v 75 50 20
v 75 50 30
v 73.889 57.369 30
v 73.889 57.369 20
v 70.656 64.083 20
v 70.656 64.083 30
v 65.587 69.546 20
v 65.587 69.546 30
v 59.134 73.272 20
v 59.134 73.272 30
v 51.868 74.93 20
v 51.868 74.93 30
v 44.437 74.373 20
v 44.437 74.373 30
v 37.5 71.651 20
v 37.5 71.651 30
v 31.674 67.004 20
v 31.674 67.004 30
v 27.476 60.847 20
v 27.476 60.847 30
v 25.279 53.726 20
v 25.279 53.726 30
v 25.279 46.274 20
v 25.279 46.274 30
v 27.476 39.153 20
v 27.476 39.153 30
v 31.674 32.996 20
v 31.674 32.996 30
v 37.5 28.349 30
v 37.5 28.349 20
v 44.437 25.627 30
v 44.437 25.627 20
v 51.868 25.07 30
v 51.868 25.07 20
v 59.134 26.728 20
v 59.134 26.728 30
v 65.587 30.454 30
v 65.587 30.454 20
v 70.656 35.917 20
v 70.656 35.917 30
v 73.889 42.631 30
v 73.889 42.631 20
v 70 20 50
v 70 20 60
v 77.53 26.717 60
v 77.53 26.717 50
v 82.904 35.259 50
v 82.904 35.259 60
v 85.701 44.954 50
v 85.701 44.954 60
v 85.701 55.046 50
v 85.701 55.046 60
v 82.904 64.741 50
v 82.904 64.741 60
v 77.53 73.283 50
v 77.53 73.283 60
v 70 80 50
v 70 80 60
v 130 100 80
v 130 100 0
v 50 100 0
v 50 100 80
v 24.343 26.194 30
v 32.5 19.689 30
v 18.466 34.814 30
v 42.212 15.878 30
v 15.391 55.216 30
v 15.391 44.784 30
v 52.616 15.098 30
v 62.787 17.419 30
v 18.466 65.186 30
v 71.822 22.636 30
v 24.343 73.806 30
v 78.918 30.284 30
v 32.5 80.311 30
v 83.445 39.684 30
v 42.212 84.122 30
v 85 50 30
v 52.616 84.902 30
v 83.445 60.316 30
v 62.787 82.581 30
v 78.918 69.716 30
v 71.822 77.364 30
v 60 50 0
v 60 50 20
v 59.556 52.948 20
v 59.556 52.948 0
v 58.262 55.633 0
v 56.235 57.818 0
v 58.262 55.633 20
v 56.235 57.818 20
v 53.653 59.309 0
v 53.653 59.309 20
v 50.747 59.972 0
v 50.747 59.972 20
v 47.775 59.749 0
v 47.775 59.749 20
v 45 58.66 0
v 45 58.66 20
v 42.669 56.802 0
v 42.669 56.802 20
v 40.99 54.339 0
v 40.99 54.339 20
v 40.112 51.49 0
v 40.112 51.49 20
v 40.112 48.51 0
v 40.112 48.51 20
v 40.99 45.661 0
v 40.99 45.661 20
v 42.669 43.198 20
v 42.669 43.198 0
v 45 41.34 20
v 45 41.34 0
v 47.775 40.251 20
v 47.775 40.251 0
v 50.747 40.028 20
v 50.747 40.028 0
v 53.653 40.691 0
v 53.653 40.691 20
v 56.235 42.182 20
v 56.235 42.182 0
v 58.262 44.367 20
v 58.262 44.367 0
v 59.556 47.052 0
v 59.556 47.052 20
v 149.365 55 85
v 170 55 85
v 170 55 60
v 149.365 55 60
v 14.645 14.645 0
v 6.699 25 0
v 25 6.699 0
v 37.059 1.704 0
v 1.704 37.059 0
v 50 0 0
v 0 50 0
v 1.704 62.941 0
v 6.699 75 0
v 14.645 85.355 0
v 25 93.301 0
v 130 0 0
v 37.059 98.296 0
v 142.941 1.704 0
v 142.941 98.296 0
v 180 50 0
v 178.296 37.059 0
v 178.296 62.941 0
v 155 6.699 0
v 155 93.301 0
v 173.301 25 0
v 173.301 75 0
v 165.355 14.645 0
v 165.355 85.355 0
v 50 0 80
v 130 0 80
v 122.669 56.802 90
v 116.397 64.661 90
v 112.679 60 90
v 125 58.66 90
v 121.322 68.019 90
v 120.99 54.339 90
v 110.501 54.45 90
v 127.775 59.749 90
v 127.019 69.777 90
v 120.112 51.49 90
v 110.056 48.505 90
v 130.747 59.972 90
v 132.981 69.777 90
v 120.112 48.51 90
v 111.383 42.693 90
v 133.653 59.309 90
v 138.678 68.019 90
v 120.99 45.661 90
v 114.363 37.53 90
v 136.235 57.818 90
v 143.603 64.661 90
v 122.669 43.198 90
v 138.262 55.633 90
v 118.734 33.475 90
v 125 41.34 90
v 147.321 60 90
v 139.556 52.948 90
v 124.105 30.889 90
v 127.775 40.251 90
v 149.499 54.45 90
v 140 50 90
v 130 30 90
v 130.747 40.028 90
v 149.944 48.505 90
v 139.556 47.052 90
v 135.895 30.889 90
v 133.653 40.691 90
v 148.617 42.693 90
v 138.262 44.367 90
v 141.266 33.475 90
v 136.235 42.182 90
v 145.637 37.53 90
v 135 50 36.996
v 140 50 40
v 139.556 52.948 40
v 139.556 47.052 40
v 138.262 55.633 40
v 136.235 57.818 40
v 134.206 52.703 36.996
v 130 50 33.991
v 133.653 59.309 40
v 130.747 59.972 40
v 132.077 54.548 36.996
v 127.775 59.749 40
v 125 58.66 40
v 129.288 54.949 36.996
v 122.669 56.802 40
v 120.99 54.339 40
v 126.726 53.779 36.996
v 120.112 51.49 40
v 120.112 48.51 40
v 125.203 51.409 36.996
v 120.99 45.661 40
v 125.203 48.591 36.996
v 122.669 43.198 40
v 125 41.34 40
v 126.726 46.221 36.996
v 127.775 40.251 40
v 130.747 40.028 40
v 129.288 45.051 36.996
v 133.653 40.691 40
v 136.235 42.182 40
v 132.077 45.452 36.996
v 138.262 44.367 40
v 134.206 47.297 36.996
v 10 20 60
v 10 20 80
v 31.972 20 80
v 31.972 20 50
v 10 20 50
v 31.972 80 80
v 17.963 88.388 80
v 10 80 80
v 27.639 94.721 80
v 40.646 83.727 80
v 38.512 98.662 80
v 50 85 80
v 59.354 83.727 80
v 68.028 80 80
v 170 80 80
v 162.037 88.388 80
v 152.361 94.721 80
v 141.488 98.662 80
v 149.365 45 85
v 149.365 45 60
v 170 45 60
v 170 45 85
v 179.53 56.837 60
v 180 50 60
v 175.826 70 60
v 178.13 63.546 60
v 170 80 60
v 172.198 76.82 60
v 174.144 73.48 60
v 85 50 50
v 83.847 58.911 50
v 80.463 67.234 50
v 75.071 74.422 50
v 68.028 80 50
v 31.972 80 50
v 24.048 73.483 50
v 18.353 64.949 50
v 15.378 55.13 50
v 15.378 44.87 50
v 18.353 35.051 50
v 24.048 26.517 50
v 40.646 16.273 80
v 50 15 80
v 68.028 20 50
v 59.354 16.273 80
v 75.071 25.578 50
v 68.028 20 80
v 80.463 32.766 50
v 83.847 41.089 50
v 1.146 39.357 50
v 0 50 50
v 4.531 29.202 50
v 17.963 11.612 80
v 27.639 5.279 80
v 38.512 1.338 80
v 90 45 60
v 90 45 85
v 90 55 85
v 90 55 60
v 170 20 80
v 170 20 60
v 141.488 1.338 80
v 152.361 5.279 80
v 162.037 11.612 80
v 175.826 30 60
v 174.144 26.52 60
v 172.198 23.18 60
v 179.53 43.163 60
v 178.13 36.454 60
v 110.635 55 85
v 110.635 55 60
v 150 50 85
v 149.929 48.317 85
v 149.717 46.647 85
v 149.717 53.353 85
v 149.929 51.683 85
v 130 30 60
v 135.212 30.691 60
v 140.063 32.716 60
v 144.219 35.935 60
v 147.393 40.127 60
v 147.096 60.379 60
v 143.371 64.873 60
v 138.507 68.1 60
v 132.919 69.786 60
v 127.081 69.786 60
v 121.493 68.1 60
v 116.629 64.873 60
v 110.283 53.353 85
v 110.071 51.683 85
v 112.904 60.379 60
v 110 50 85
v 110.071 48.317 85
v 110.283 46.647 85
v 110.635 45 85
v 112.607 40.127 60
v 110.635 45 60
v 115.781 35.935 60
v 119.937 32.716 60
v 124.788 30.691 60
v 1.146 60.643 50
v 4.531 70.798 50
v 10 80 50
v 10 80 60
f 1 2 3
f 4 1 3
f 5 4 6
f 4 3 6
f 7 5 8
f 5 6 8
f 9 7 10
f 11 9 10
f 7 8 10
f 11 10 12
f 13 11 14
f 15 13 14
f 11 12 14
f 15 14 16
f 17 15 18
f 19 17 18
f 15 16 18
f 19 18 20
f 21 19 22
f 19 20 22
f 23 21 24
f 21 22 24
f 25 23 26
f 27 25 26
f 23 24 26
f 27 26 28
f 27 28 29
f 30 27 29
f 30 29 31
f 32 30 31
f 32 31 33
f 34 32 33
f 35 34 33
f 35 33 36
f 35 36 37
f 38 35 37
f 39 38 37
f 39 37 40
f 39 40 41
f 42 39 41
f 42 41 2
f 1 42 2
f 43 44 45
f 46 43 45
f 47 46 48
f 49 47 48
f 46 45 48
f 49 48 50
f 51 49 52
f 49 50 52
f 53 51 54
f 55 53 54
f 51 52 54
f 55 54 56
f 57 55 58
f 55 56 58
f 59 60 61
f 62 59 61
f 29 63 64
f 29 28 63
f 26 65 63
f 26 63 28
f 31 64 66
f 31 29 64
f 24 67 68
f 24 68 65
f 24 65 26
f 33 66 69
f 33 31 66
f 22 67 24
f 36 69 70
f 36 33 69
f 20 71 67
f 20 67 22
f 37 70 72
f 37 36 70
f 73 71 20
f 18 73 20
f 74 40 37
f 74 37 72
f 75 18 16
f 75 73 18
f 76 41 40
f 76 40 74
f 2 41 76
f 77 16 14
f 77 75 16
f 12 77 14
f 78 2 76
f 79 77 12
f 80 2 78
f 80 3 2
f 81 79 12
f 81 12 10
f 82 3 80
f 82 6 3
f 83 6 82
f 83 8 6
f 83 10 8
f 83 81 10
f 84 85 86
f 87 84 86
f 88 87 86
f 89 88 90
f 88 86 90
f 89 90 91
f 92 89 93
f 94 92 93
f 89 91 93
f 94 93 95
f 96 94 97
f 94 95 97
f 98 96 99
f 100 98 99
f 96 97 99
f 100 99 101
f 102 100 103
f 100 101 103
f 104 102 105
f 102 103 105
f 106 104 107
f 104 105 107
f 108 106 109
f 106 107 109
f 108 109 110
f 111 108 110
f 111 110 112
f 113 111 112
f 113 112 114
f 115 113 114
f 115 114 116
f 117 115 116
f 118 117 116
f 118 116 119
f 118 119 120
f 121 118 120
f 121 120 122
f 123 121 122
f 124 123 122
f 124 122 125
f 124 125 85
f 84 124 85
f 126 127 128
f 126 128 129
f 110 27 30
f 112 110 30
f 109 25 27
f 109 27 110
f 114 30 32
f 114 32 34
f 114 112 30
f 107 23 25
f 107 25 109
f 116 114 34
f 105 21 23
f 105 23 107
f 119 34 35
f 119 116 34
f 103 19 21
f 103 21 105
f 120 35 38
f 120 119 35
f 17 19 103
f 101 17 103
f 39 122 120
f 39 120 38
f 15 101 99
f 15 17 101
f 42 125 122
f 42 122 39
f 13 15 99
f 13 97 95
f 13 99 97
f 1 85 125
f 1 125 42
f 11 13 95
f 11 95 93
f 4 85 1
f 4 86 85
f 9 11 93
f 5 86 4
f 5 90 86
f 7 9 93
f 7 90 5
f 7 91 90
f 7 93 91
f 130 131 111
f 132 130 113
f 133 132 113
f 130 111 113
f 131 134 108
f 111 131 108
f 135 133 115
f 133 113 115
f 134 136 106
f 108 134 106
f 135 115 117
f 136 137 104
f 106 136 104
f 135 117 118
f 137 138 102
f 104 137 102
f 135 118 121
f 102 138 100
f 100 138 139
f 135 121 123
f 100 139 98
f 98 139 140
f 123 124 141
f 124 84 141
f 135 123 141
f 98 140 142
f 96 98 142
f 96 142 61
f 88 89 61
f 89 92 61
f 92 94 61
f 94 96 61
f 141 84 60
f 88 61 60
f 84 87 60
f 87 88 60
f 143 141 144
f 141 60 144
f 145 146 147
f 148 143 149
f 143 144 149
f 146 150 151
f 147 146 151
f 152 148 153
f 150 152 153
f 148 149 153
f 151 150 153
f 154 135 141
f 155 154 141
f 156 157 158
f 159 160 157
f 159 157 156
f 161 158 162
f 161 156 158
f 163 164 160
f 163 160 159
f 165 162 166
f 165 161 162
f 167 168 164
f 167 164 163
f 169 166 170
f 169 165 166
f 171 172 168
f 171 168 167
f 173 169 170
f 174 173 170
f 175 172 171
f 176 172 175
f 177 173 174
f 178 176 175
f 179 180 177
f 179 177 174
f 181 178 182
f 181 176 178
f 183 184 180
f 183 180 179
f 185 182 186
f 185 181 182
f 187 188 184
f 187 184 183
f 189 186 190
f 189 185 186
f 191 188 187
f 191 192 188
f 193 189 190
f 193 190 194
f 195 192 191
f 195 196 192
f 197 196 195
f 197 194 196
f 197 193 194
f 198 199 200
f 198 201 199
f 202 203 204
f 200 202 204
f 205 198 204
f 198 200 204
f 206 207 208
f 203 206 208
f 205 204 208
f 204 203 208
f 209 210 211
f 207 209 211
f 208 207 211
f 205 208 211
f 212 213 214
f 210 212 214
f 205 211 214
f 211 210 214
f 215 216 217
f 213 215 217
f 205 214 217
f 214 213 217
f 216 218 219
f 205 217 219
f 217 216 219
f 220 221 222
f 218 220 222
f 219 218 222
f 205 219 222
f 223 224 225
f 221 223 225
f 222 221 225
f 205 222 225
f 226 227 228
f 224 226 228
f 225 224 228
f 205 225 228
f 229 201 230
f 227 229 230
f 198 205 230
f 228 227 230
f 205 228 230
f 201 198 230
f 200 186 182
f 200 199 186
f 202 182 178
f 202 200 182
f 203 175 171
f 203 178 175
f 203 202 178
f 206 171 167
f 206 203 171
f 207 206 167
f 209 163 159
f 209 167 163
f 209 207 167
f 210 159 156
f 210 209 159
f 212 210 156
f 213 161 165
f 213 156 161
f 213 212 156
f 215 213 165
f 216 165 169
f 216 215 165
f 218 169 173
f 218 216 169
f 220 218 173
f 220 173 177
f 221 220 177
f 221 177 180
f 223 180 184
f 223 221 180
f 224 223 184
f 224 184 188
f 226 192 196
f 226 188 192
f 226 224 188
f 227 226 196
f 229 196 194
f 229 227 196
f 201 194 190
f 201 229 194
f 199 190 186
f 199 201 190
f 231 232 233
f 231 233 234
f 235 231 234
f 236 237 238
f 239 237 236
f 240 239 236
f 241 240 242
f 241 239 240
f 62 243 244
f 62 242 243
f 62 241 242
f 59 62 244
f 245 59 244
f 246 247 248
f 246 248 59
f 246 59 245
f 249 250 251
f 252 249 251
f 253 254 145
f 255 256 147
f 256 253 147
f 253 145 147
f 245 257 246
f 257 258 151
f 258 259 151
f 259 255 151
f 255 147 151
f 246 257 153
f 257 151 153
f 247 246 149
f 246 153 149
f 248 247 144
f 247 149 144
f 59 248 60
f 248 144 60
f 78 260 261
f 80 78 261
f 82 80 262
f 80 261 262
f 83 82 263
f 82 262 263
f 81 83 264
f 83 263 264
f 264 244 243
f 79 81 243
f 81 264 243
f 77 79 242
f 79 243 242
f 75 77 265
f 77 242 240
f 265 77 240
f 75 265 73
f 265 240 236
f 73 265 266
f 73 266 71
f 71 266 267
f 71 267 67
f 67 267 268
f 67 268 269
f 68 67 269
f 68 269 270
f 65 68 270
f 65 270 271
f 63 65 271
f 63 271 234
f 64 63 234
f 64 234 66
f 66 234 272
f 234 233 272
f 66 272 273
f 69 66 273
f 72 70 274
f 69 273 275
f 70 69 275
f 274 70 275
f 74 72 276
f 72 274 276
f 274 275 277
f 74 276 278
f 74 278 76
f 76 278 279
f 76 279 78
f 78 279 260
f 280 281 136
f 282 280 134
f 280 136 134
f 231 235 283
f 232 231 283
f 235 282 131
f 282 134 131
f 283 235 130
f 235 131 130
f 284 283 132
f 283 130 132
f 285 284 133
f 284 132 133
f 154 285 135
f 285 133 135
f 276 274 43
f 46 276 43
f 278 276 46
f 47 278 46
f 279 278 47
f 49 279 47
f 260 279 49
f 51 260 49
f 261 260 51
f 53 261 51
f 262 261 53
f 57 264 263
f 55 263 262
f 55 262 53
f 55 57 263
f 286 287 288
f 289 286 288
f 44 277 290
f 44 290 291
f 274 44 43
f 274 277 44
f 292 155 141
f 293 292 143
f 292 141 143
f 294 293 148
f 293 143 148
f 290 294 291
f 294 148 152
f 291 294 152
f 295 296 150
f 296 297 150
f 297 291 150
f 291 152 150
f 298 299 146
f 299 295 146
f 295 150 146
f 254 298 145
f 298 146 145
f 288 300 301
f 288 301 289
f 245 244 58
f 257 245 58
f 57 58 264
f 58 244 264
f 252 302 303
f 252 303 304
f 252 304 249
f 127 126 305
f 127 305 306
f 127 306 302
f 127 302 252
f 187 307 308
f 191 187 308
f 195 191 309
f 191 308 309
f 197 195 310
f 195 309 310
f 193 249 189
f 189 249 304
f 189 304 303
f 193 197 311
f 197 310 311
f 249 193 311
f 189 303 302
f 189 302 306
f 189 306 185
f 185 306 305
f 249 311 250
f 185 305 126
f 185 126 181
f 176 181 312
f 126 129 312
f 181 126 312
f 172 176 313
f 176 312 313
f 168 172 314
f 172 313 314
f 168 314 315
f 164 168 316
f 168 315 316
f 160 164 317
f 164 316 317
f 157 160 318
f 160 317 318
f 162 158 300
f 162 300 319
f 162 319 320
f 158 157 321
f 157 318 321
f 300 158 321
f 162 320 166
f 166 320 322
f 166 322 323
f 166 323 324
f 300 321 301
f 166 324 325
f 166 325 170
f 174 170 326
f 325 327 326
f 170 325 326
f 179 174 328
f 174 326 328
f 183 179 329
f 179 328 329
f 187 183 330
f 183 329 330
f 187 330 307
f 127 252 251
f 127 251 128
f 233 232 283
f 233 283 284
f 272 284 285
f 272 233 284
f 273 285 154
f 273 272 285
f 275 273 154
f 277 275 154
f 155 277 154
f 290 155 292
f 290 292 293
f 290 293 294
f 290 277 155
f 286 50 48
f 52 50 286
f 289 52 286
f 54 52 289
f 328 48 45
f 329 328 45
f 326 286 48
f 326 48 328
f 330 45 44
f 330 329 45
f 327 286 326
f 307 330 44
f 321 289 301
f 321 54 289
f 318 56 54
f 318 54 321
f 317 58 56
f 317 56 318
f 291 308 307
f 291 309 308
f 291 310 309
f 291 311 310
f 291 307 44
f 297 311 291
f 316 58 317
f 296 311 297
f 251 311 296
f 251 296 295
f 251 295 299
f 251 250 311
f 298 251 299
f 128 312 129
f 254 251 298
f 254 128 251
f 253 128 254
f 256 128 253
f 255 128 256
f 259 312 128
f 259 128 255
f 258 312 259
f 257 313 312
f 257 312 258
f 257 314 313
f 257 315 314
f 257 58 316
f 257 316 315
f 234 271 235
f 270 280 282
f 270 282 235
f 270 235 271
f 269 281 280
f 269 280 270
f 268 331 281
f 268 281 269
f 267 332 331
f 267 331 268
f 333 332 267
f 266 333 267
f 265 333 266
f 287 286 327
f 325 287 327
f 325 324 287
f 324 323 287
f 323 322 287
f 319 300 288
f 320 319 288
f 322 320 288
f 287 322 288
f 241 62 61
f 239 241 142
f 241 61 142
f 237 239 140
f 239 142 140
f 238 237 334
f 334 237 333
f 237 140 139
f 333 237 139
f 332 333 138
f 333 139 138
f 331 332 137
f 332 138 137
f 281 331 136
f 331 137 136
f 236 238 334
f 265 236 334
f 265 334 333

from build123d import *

# Parameters (mm, degrees)
BOSS_EXTRUDE1_DEPTH        = 80
SKETCH2_W                  = 20
SKETCH2_H                  = 10
CUT_EXTRUDE1_DEPTH         = 209
SKETCH3_R                  = 10
CUT_EXTRUDE2_DEPTH         = 40
SKETCH4_R                  = 20
SKETCH4_R_2                = 10
BOSS_EXTRUDE2_DEPTH        = 10
F_20_0MM_DOWEL_HOLE1_D     = 20
F_20_0MM_DOWEL_HOLE1_DEPTH = 50
F_20_0MM_DOWEL_HOLE1_TIP   = 6.00860619
CUT_EXTRUDE3_DEPTH         = 20
SKETCH10_R                 = 10
CUT_EXTRUDE4_DEPTH         = 74
SKETCH11_R                 = 25
SKETCH11_R_2               = 10
CUT_EXTRUDE5_DEPTH         = 40
SKETCH12_R                 = 25
CUT_EXTRUDE6_DEPTH         = 10
SKETCH14_R                 = 35
SKETCH14_R_2               = 25
CUT_EXTRUDE7_DEPTH         = 30
SKETCH15_R                 = 35
CUT_EXTRUDE8_DEPTH         = 30
CUT_EXTRUDE9_DEPTH         = 20
SKETCH17_W                 = 20
SKETCH17_H                 = 5
BOSS_EXTRUDE3_DEPTH        = 25
SKETCH18_W                 = 20
SKETCH18_H                 = 5
BOSS_EXTRUDE4_DEPTH        = 25
SKETCH19_W                 = 20
SKETCH19_H                 = 5
BOSS_EXTRUDE5_DEPTH        = 25


with BuildPart() as part:
    # Sketch1 → Boss-Extrude1 (new body)
    with BuildSketch(Plane.XY):
        with BuildLine():
            ThreePointArc((0, 50), (14.644660941, 14.644660941), (50, 0))
            Line((50, 0), (130, 0))
            ThreePointArc((130, 0), (165.355339059, 14.644660941), (180, 50))
            ThreePointArc((180, 50), (165.355339059, 85.355339059), (130, 100))
            Line((130, 100), (50, 100))
            ThreePointArc((50, 100), (14.644660941, 85.355339059), (0, 50))
        make_face()
    extrude(amount=BOSS_EXTRUDE1_DEPTH)

    # Sketch2 → Cut-Extrude1 (cut)
    with BuildSketch(Plane(origin=(0, 0, 0), x_dir=(0, 0, -1), z_dir=(1, 0, 0))):
        with Locations((-70, 75)):
            Rectangle(SKETCH2_W, SKETCH2_H)
        with Locations((-70, 25)):
            Rectangle(SKETCH2_W, SKETCH2_H)
    extrude(amount=CUT_EXTRUDE1_DEPTH, mode=Mode.SUBTRACT)

    # Sketch3 → Cut-Extrude2 (cut)
    with BuildSketch(Plane.XY.offset(80)):
        with Locations((130, 50)):
            Circle(SKETCH3_R)
    extrude(amount=-CUT_EXTRUDE2_DEPTH, mode=Mode.SUBTRACT)

    # Sketch4 → Boss-Extrude2 (add)
    with BuildSketch(Plane.XY.offset(80)):
        with Locations(Location((130, 50, 0), (0, 0, 270))):
            Circle(SKETCH4_R)
        with Locations((130, 50)):
            Circle(SKETCH4_R_2, mode=Mode.SUBTRACT)
    extrude(amount=BOSS_EXTRUDE2_DEPTH)

    # Ø20.0mm Dowel Hole1
    with Locations(Plane(origin=(130, 50, 90), x_dir=(1, 0, 0), z_dir=(0, 0, 1))):
        with Locations((0, 0)):
            Hole(F_20_0MM_DOWEL_HOLE1_D / 2, depth=F_20_0MM_DOWEL_HOLE1_DEPTH)
            with Locations((0, 0, -(F_20_0MM_DOWEL_HOLE1_DEPTH + F_20_0MM_DOWEL_HOLE1_TIP / 2))):  # 118° drill point
                Cone(0, F_20_0MM_DOWEL_HOLE1_D / 2, F_20_0MM_DOWEL_HOLE1_TIP, mode=Mode.SUBTRACT)

    # Sketch9 → Cut-Extrude3 (cut)
    with BuildSketch(Plane.XY.offset(80)):
        with BuildLine():
            Line((130, 70), (4.17424305, 70))
            ThreePointArc((4.17424305, 70), (0, 50), (4.17424305, 30))
            Line((4.17424305, 30), (130, 30))
            ThreePointArc((130, 30), (110, 50), (130, 70))
        make_face()
    extrude(amount=-CUT_EXTRUDE3_DEPTH, mode=Mode.SUBTRACT)

    # Sketch10 → Cut-Extrude4 (cut)
    with BuildSketch(Plane.XY.offset(60)):
        with Locations((50, 50)):
            Circle(SKETCH10_R)
    extrude(amount=-CUT_EXTRUDE4_DEPTH, mode=Mode.SUBTRACT)

    # Sketch11 → Cut-Extrude5 (cut)
    with BuildSketch(Plane.XY.offset(60)):
        with Locations((50, 50)):
            Circle(SKETCH11_R)
        with Locations((50, 50)):
            Circle(SKETCH11_R_2, mode=Mode.SUBTRACT)
    extrude(amount=-CUT_EXTRUDE5_DEPTH, mode=Mode.SUBTRACT)

    # Sketch12 → Cut-Extrude6 (cut)
    with BuildSketch(Plane.XY.offset(60)):
        with BuildLine():
            Line((70, 80), (10, 80))
            ThreePointArc((10, 80), (0, 50), (10, 20))
            Line((10, 20), (70, 20))
            ThreePointArc((70, 20), (86.055512755, 50), (70, 80))
        make_face()
        with Locations((50, 50)):
            Circle(SKETCH12_R, mode=Mode.SUBTRACT)
    extrude(amount=-CUT_EXTRUDE6_DEPTH, mode=Mode.SUBTRACT)

    # Sketch14 → Cut-Extrude7 (cut)
    with BuildSketch(Plane.XY.offset(60)):
        with Locations((50, 50)):
            Circle(SKETCH14_R)
        with Locations((50, 50)):
            Circle(SKETCH14_R_2, mode=Mode.SUBTRACT)
    extrude(amount=-CUT_EXTRUDE7_DEPTH, mode=Mode.SUBTRACT)

    # Sketch15 → Cut-Extrude8 (cut)
    with BuildSketch(Plane.XY.offset(80)):
        with Locations((50, 50)):
            Circle(SKETCH15_R)
    extrude(amount=-CUT_EXTRUDE8_DEPTH, mode=Mode.SUBTRACT)

    # Sketch16 → Cut-Extrude9 (cut)
    with BuildSketch(Plane.XY.offset(80)):
        with BuildLine():
            Line((130, 70), (175.82575695, 70))
            ThreePointArc((175.82575695, 70), (180, 50), (175.82575695, 30))
            Line((175.82575695, 30), (130, 30))
            ThreePointArc((130, 30), (150, 50), (130, 70))
        make_face()
    extrude(amount=-CUT_EXTRUDE9_DEPTH, mode=Mode.SUBTRACT)

    # Sketch17 → Boss-Extrude3 (add)
    with BuildSketch(Plane.XY.offset(60)):
        with BuildLine():
            Line((150, 45), (150, 50))
            ThreePointArc((150, 50), (149.840593925, 47.47991415), (149.364916731, 45))
            Line((149.364916731, 45), (150, 45))
        make_face()
        with Locations((160, 47.5)):
            Rectangle(SKETCH17_W, SKETCH17_H)
        with BuildLine():
            ThreePointArc((110.635083269, 45), (110.159406075, 47.47991415), (110, 50))
            Line((110, 50), (110, 45))
            Line((110, 45), (110.635083269, 45))
        make_face()
        with Locations((100, 47.5)):
            Rectangle(SKETCH17_W, SKETCH17_H)
    extrude(amount=BOSS_EXTRUDE3_DEPTH)

    # Sketch18 → Boss-Extrude4 (add)
    with BuildSketch(Plane.XY.offset(85)):
        with BuildLine():
            ThreePointArc((110.635083269, 55), (110.159406075, 52.52008585), (110, 50))
            Line((110, 50), (110, 55))
            Line((110, 55), (110.635083269, 55))
        make_face()
        with Locations((100, 52.5)):
            Rectangle(SKETCH18_W, SKETCH18_H)
    extrude(amount=-BOSS_EXTRUDE4_DEPTH)

    # Sketch19 → Boss-Extrude5 (add)
    with BuildSketch(Plane.XY.offset(85)):
        with BuildLine():
            Line((150, 55), (149.364916731, 55))
            ThreePointArc((149.364916731, 55), (149.840593925, 52.52008585), (150, 50))
            Line((150, 50), (150, 55))
        make_face()
        with Locations((160, 52.5)):
            Rectangle(SKETCH19_W, SKETCH19_H)
    extrude(amount=-BOSS_EXTRUDE5_DEPTH)


solid = part.part
